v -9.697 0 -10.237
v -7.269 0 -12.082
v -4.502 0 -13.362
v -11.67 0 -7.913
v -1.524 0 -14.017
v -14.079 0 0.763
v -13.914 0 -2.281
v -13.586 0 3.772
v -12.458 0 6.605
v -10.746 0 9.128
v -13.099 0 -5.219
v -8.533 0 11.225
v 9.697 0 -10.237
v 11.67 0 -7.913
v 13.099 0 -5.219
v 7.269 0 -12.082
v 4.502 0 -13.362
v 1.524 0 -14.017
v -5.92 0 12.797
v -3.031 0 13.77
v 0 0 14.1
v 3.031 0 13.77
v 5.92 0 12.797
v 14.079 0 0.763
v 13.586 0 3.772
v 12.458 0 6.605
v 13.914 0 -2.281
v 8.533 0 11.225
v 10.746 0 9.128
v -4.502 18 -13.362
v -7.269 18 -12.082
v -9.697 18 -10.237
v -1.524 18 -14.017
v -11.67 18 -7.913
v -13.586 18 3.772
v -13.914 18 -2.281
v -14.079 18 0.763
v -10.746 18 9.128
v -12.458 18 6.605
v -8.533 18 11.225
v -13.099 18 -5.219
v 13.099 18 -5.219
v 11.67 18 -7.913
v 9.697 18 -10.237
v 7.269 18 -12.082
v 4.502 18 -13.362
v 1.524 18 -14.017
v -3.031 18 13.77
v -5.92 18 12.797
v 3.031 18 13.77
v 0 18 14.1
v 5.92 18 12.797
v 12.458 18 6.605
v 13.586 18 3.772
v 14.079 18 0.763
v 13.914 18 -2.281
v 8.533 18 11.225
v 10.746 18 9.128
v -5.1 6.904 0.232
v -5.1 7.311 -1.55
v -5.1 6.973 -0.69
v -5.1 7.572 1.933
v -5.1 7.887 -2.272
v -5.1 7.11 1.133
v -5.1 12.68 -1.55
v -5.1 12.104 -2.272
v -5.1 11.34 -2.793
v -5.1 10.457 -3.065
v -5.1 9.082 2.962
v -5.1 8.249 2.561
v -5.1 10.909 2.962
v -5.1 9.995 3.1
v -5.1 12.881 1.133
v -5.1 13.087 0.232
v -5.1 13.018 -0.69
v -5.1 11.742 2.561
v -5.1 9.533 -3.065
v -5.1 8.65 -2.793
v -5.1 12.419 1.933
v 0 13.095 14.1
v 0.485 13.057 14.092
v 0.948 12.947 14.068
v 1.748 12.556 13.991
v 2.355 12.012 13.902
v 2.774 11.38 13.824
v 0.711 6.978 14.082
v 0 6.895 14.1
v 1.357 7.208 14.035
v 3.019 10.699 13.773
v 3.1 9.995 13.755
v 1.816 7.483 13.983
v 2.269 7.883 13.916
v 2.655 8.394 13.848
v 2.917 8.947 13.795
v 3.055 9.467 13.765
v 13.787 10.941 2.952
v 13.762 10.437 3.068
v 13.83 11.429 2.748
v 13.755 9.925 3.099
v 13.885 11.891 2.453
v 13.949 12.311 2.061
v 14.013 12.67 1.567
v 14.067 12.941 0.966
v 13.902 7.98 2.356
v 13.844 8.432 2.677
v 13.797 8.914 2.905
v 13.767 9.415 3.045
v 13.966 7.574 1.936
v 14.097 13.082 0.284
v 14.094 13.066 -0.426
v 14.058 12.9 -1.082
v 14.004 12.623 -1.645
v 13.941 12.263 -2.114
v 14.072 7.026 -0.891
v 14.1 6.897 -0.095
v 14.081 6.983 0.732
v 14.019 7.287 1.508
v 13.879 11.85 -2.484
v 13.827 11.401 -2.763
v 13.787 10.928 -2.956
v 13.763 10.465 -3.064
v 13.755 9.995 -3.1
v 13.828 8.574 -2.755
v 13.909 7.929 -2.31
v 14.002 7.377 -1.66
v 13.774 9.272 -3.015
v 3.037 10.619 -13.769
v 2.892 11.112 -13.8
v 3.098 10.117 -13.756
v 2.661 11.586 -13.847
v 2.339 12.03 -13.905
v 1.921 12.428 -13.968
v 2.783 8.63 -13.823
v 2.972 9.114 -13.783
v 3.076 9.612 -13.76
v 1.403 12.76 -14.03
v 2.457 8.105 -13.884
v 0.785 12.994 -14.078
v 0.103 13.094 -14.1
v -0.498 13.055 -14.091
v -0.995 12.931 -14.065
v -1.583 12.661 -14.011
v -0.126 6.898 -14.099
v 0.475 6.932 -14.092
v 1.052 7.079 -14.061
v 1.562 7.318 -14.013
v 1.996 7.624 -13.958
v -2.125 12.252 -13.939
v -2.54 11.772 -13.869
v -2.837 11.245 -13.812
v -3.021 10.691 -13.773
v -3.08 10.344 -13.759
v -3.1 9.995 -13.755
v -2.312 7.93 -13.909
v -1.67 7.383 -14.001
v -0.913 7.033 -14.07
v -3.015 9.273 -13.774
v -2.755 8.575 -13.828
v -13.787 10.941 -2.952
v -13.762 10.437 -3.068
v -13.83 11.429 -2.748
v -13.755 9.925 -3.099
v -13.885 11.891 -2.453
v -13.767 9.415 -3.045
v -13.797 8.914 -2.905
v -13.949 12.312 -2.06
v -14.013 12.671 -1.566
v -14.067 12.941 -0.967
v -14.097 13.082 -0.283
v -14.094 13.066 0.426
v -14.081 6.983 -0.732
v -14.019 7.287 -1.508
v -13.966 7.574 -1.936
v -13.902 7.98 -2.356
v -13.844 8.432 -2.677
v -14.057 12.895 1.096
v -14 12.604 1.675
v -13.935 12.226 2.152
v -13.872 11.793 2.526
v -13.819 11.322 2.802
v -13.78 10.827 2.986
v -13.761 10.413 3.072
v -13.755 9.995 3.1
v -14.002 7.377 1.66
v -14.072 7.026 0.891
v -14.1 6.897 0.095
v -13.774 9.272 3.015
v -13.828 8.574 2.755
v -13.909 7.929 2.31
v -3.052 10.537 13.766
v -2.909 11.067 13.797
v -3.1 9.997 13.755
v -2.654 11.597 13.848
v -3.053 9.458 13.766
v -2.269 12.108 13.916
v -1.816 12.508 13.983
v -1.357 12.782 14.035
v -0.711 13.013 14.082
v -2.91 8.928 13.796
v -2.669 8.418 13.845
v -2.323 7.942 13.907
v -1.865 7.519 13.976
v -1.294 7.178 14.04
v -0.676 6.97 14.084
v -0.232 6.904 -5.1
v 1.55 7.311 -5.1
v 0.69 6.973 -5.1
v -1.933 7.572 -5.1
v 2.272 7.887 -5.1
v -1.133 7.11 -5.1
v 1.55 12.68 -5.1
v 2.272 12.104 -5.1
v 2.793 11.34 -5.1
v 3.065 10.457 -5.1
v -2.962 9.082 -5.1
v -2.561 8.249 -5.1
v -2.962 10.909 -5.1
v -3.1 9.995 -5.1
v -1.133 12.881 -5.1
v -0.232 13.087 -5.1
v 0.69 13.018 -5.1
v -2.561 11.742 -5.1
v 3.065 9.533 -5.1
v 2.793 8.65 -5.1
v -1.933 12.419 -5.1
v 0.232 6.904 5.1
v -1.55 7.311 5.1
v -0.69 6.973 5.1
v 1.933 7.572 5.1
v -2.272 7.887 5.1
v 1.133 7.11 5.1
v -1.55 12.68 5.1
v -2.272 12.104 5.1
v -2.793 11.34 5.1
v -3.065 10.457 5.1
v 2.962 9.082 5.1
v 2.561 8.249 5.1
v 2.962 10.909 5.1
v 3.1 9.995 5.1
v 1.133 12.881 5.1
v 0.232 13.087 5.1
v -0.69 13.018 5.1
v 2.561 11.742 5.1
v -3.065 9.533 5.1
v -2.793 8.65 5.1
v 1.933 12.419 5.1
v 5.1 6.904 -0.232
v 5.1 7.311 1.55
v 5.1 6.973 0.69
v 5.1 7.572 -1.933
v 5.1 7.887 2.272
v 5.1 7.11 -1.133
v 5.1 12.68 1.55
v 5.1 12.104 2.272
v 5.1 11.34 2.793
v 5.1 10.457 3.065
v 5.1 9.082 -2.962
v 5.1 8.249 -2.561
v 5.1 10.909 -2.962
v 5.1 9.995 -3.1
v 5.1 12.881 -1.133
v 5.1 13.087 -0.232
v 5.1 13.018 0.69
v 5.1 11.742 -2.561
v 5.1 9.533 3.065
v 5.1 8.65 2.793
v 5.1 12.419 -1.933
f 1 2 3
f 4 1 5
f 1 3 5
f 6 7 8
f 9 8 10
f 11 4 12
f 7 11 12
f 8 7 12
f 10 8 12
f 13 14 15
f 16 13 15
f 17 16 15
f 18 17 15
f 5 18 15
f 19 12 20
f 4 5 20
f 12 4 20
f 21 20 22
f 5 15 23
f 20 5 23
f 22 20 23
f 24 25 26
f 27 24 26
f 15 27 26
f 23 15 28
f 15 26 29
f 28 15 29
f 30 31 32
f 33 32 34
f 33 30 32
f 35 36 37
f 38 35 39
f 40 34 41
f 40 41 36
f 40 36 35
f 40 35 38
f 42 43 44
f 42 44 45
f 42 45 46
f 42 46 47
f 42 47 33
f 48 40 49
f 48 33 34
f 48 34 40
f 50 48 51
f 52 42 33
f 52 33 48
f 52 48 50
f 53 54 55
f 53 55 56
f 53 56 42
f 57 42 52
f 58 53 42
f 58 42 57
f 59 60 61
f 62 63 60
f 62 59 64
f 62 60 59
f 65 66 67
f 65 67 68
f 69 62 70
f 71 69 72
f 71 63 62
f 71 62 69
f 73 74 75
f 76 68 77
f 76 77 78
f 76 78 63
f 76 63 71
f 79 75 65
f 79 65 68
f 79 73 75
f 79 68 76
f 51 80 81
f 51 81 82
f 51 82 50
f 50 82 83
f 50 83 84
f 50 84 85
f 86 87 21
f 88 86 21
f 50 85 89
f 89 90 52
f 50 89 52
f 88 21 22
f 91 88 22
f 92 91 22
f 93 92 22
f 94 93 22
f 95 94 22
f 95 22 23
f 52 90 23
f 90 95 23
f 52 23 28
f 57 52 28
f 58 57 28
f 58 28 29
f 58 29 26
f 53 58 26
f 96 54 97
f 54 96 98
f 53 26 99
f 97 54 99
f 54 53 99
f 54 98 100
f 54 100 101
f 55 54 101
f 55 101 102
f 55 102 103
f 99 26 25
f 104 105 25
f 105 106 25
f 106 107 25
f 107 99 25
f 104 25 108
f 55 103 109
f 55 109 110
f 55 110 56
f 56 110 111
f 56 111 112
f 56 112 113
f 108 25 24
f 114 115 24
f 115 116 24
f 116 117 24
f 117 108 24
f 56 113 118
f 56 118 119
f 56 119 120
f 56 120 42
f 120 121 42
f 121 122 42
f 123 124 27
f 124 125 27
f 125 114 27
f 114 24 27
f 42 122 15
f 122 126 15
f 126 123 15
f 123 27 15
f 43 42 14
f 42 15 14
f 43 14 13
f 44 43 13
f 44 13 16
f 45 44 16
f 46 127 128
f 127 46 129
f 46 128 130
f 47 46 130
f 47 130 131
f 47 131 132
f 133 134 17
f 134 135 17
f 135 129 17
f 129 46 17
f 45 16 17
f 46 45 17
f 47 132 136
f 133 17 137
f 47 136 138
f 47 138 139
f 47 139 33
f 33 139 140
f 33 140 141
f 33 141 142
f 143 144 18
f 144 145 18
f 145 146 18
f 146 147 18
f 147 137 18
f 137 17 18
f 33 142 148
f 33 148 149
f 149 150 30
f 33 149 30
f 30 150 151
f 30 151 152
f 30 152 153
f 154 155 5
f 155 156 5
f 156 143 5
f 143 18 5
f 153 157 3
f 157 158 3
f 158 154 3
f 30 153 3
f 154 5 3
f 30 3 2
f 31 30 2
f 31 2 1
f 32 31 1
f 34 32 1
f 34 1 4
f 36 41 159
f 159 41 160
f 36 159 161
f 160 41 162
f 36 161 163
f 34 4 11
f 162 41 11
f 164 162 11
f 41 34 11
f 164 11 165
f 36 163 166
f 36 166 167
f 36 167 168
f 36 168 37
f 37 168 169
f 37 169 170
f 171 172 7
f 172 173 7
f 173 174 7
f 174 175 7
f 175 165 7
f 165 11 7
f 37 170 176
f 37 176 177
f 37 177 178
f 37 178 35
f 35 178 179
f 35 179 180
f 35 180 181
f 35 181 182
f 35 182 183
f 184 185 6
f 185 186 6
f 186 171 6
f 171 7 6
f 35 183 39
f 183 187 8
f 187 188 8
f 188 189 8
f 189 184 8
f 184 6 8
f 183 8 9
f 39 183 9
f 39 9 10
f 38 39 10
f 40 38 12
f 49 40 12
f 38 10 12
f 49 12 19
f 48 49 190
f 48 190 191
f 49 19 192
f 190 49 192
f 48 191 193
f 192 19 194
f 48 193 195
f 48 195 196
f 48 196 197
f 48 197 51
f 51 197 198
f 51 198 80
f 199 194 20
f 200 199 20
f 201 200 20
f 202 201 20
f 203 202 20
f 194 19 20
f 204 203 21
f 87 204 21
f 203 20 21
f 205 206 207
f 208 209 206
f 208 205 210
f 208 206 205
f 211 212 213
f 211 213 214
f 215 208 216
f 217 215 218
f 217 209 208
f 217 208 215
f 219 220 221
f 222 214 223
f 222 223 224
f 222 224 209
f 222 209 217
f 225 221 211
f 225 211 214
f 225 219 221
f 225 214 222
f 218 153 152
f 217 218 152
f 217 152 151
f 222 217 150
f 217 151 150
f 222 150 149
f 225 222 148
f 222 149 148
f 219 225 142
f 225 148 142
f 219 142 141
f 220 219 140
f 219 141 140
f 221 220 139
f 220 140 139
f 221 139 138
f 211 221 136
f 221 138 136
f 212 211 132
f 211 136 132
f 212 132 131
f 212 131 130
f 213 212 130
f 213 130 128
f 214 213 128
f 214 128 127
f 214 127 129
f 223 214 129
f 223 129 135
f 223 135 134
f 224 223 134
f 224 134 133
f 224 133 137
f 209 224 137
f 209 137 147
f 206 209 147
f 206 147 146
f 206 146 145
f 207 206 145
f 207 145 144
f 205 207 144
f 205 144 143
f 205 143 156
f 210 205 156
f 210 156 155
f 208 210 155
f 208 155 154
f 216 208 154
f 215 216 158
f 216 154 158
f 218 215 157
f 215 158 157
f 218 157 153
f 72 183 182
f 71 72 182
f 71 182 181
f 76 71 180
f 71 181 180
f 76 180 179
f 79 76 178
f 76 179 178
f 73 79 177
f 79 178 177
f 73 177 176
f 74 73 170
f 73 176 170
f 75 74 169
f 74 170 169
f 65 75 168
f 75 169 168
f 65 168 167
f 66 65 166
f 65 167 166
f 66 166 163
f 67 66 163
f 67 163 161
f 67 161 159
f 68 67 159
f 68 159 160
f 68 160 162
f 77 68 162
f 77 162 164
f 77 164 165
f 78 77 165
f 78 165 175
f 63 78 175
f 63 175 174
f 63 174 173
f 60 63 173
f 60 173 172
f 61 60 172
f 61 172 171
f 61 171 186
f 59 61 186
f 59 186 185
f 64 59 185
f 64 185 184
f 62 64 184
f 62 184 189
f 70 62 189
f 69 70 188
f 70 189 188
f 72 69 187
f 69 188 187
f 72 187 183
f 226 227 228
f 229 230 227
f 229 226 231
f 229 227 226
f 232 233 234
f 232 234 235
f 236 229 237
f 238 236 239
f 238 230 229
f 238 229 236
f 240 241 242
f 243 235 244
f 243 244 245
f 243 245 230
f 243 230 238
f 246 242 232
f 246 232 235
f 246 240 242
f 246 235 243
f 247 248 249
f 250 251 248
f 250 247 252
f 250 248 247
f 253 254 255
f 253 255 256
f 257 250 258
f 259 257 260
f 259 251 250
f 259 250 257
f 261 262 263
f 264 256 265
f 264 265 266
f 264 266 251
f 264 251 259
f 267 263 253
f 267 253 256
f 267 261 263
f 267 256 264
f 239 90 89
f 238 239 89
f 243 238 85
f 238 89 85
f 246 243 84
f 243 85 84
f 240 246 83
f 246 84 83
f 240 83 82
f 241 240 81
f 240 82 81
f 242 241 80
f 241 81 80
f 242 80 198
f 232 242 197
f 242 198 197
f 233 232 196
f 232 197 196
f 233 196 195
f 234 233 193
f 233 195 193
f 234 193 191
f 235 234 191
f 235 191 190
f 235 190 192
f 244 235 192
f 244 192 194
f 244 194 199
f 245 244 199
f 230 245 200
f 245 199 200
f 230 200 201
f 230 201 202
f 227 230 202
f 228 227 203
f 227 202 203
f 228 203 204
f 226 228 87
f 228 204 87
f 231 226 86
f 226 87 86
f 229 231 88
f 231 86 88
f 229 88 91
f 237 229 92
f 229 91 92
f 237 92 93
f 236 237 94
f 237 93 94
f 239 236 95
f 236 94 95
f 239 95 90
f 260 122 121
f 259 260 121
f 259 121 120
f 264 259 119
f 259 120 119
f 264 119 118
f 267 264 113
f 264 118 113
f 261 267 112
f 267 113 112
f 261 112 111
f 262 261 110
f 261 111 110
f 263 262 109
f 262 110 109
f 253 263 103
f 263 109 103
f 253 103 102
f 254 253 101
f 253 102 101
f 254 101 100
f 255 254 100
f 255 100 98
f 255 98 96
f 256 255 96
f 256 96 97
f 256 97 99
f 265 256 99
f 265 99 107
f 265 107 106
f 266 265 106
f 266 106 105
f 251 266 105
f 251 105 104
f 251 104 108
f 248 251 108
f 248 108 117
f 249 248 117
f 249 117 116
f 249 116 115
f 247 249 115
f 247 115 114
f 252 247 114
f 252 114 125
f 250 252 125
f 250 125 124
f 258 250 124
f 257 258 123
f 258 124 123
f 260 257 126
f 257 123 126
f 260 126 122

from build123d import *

# Parameters (mm, degrees)
SKETCH1_R           = 14.1
BOSS_EXTRUDE1_DEPTH = 18
SKETCH2_R           = 3.1
CUT_EXTRUDE1_DEPTH  = 9
CIRPATTERN1_COUNT   = 4


with BuildPart() as part:
    # Sketch1 → Boss-Extrude1 (new body)
    with BuildSketch(Plane(origin=(0, 0, 0), x_dir=(1, 0, 0), z_dir=(0, 1, 0))):
        Circle(SKETCH1_R)
    extrude(amount=BOSS_EXTRUDE1_DEPTH)

    # Sketch2 → Cut-Extrude1 (cut)
    with BuildSketch(Plane(origin=(14.1, 0, 0), x_dir=(0, 0, -1), z_dir=(1, 0, 0))):
        with Locations((0, 9.995362646)):
            Circle(SKETCH2_R)
    cut_extrude1 = extrude(amount=-CUT_EXTRUDE1_DEPTH, mode=Mode.SUBTRACT)

    # CirPattern1: Cut-Extrude1 ×4 about axis
    cirpattern1_axis = Axis((0, 18, 0), (0, -1, 0))
    for i in range(1, CIRPATTERN1_COUNT):
        add(cut_extrude1.rotate(cirpattern1_axis, i * 360 / CIRPATTERN1_COUNT), mode=Mode.SUBTRACT)


solid = part.part
